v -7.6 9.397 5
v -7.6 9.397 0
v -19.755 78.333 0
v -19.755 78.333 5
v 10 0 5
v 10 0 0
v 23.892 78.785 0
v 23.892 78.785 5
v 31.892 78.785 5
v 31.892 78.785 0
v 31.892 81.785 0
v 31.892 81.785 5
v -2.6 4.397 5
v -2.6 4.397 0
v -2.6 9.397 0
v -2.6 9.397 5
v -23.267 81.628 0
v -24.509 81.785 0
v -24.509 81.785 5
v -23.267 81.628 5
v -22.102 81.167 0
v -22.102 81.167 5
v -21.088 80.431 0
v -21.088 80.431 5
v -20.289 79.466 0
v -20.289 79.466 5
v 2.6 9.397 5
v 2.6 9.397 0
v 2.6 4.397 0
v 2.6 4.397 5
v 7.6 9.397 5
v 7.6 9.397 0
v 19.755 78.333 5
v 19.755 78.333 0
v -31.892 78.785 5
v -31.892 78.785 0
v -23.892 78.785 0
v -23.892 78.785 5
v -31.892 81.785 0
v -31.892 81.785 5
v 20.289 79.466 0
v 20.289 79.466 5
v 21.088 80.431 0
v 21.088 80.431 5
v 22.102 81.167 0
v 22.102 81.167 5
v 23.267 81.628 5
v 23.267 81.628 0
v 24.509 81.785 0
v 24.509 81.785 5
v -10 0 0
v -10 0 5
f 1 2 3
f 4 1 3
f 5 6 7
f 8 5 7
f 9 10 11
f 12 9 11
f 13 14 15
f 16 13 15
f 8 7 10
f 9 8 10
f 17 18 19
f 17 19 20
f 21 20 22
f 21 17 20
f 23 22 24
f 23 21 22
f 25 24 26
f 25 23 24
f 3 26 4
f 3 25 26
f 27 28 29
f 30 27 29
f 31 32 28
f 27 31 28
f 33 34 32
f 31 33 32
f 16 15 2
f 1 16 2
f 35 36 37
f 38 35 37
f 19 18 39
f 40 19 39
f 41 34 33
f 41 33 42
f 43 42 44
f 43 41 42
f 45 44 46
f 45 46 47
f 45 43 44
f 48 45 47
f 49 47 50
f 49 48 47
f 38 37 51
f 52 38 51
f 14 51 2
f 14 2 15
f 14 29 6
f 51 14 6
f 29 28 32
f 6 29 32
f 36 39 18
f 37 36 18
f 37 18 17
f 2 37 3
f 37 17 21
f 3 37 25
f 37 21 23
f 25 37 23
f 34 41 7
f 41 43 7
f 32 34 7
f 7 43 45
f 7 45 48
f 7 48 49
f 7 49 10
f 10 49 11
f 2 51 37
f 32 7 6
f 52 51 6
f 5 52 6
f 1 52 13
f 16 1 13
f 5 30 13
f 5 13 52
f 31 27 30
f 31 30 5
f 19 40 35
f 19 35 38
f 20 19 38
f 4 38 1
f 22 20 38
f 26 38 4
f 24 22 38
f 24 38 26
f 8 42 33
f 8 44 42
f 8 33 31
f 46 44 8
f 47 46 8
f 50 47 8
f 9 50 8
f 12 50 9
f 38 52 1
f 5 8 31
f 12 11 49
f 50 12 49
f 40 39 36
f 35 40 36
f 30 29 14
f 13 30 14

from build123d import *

# Parameters (mm, degrees)
F1_DEPTH    = 5
F2_T1_DEPTH = 28.770290161


# Not quite as in the source:
# - a fillet or chamfer that OpenCascade refuses, or shapes differently, is made with other operations: its cross-section is extruded or revolved along the edge and cut away or added


with BuildPart() as f1:
    # F0 (on Top) → F1 (new body)
    with BuildSketch(Plane.XY):
        Polygon((-10, 0), (0, 0), (10, 0), (23.8918542134, 78.784620241), (31.8918542134, 78.784620241), (31.8918542134, 81.784620241), (19.7553724367, 81.784620241), (19.7553724367, 78.3334689187), (7.6, 9.3969262079), (2.6, 9.3969262079), (2.6, 4.3969262079), (0, 4.3969262079), (-2.6, 4.3969262079), (-2.6, 9.3969262079), (-7.6, 9.3969262079), (-19.7553724367, 78.3334689187), (-19.7553724367, 81.784620241), (-31.8918542134, 81.784620241), (-31.8918542134, 78.784620241), (-23.8918542134, 78.784620241), align=None)
    extrude(amount=F1_DEPTH)

    # F2: fillet of radius 5 on 2 edges, made by hand

    # F2_s2 → F2_t1 (cut)
    with BuildSketch(Plane.XY.offset(-11.8851450805)):
        with BuildLine():
            ThreePointArc((-24.5094304689, 81.784620241), (-21.5721054433, 80.8308680948), (-19.7553724367, 78.3334689187))
            Line((-19.7553724367, 78.3334689187), (-19.7553724367, 81.784620241))
            Line((-19.7553724367, 81.784620241), (-24.5094304689, 81.784620241))
        make_face()
        with BuildLine():
            ThreePointArc((19.7553724367, 78.3334689187), (21.5721054433, 80.8308680948), (24.5094304689, 81.784620241))
            Line((24.5094304689, 81.784620241), (19.7553724367, 81.784620241))
            Line((19.7553724367, 81.784620241), (19.7553724367, 78.3334689187))
        make_face()
    extrude(amount=F2_T1_DEPTH, mode=Mode.SUBTRACT)


solid = f1.part
